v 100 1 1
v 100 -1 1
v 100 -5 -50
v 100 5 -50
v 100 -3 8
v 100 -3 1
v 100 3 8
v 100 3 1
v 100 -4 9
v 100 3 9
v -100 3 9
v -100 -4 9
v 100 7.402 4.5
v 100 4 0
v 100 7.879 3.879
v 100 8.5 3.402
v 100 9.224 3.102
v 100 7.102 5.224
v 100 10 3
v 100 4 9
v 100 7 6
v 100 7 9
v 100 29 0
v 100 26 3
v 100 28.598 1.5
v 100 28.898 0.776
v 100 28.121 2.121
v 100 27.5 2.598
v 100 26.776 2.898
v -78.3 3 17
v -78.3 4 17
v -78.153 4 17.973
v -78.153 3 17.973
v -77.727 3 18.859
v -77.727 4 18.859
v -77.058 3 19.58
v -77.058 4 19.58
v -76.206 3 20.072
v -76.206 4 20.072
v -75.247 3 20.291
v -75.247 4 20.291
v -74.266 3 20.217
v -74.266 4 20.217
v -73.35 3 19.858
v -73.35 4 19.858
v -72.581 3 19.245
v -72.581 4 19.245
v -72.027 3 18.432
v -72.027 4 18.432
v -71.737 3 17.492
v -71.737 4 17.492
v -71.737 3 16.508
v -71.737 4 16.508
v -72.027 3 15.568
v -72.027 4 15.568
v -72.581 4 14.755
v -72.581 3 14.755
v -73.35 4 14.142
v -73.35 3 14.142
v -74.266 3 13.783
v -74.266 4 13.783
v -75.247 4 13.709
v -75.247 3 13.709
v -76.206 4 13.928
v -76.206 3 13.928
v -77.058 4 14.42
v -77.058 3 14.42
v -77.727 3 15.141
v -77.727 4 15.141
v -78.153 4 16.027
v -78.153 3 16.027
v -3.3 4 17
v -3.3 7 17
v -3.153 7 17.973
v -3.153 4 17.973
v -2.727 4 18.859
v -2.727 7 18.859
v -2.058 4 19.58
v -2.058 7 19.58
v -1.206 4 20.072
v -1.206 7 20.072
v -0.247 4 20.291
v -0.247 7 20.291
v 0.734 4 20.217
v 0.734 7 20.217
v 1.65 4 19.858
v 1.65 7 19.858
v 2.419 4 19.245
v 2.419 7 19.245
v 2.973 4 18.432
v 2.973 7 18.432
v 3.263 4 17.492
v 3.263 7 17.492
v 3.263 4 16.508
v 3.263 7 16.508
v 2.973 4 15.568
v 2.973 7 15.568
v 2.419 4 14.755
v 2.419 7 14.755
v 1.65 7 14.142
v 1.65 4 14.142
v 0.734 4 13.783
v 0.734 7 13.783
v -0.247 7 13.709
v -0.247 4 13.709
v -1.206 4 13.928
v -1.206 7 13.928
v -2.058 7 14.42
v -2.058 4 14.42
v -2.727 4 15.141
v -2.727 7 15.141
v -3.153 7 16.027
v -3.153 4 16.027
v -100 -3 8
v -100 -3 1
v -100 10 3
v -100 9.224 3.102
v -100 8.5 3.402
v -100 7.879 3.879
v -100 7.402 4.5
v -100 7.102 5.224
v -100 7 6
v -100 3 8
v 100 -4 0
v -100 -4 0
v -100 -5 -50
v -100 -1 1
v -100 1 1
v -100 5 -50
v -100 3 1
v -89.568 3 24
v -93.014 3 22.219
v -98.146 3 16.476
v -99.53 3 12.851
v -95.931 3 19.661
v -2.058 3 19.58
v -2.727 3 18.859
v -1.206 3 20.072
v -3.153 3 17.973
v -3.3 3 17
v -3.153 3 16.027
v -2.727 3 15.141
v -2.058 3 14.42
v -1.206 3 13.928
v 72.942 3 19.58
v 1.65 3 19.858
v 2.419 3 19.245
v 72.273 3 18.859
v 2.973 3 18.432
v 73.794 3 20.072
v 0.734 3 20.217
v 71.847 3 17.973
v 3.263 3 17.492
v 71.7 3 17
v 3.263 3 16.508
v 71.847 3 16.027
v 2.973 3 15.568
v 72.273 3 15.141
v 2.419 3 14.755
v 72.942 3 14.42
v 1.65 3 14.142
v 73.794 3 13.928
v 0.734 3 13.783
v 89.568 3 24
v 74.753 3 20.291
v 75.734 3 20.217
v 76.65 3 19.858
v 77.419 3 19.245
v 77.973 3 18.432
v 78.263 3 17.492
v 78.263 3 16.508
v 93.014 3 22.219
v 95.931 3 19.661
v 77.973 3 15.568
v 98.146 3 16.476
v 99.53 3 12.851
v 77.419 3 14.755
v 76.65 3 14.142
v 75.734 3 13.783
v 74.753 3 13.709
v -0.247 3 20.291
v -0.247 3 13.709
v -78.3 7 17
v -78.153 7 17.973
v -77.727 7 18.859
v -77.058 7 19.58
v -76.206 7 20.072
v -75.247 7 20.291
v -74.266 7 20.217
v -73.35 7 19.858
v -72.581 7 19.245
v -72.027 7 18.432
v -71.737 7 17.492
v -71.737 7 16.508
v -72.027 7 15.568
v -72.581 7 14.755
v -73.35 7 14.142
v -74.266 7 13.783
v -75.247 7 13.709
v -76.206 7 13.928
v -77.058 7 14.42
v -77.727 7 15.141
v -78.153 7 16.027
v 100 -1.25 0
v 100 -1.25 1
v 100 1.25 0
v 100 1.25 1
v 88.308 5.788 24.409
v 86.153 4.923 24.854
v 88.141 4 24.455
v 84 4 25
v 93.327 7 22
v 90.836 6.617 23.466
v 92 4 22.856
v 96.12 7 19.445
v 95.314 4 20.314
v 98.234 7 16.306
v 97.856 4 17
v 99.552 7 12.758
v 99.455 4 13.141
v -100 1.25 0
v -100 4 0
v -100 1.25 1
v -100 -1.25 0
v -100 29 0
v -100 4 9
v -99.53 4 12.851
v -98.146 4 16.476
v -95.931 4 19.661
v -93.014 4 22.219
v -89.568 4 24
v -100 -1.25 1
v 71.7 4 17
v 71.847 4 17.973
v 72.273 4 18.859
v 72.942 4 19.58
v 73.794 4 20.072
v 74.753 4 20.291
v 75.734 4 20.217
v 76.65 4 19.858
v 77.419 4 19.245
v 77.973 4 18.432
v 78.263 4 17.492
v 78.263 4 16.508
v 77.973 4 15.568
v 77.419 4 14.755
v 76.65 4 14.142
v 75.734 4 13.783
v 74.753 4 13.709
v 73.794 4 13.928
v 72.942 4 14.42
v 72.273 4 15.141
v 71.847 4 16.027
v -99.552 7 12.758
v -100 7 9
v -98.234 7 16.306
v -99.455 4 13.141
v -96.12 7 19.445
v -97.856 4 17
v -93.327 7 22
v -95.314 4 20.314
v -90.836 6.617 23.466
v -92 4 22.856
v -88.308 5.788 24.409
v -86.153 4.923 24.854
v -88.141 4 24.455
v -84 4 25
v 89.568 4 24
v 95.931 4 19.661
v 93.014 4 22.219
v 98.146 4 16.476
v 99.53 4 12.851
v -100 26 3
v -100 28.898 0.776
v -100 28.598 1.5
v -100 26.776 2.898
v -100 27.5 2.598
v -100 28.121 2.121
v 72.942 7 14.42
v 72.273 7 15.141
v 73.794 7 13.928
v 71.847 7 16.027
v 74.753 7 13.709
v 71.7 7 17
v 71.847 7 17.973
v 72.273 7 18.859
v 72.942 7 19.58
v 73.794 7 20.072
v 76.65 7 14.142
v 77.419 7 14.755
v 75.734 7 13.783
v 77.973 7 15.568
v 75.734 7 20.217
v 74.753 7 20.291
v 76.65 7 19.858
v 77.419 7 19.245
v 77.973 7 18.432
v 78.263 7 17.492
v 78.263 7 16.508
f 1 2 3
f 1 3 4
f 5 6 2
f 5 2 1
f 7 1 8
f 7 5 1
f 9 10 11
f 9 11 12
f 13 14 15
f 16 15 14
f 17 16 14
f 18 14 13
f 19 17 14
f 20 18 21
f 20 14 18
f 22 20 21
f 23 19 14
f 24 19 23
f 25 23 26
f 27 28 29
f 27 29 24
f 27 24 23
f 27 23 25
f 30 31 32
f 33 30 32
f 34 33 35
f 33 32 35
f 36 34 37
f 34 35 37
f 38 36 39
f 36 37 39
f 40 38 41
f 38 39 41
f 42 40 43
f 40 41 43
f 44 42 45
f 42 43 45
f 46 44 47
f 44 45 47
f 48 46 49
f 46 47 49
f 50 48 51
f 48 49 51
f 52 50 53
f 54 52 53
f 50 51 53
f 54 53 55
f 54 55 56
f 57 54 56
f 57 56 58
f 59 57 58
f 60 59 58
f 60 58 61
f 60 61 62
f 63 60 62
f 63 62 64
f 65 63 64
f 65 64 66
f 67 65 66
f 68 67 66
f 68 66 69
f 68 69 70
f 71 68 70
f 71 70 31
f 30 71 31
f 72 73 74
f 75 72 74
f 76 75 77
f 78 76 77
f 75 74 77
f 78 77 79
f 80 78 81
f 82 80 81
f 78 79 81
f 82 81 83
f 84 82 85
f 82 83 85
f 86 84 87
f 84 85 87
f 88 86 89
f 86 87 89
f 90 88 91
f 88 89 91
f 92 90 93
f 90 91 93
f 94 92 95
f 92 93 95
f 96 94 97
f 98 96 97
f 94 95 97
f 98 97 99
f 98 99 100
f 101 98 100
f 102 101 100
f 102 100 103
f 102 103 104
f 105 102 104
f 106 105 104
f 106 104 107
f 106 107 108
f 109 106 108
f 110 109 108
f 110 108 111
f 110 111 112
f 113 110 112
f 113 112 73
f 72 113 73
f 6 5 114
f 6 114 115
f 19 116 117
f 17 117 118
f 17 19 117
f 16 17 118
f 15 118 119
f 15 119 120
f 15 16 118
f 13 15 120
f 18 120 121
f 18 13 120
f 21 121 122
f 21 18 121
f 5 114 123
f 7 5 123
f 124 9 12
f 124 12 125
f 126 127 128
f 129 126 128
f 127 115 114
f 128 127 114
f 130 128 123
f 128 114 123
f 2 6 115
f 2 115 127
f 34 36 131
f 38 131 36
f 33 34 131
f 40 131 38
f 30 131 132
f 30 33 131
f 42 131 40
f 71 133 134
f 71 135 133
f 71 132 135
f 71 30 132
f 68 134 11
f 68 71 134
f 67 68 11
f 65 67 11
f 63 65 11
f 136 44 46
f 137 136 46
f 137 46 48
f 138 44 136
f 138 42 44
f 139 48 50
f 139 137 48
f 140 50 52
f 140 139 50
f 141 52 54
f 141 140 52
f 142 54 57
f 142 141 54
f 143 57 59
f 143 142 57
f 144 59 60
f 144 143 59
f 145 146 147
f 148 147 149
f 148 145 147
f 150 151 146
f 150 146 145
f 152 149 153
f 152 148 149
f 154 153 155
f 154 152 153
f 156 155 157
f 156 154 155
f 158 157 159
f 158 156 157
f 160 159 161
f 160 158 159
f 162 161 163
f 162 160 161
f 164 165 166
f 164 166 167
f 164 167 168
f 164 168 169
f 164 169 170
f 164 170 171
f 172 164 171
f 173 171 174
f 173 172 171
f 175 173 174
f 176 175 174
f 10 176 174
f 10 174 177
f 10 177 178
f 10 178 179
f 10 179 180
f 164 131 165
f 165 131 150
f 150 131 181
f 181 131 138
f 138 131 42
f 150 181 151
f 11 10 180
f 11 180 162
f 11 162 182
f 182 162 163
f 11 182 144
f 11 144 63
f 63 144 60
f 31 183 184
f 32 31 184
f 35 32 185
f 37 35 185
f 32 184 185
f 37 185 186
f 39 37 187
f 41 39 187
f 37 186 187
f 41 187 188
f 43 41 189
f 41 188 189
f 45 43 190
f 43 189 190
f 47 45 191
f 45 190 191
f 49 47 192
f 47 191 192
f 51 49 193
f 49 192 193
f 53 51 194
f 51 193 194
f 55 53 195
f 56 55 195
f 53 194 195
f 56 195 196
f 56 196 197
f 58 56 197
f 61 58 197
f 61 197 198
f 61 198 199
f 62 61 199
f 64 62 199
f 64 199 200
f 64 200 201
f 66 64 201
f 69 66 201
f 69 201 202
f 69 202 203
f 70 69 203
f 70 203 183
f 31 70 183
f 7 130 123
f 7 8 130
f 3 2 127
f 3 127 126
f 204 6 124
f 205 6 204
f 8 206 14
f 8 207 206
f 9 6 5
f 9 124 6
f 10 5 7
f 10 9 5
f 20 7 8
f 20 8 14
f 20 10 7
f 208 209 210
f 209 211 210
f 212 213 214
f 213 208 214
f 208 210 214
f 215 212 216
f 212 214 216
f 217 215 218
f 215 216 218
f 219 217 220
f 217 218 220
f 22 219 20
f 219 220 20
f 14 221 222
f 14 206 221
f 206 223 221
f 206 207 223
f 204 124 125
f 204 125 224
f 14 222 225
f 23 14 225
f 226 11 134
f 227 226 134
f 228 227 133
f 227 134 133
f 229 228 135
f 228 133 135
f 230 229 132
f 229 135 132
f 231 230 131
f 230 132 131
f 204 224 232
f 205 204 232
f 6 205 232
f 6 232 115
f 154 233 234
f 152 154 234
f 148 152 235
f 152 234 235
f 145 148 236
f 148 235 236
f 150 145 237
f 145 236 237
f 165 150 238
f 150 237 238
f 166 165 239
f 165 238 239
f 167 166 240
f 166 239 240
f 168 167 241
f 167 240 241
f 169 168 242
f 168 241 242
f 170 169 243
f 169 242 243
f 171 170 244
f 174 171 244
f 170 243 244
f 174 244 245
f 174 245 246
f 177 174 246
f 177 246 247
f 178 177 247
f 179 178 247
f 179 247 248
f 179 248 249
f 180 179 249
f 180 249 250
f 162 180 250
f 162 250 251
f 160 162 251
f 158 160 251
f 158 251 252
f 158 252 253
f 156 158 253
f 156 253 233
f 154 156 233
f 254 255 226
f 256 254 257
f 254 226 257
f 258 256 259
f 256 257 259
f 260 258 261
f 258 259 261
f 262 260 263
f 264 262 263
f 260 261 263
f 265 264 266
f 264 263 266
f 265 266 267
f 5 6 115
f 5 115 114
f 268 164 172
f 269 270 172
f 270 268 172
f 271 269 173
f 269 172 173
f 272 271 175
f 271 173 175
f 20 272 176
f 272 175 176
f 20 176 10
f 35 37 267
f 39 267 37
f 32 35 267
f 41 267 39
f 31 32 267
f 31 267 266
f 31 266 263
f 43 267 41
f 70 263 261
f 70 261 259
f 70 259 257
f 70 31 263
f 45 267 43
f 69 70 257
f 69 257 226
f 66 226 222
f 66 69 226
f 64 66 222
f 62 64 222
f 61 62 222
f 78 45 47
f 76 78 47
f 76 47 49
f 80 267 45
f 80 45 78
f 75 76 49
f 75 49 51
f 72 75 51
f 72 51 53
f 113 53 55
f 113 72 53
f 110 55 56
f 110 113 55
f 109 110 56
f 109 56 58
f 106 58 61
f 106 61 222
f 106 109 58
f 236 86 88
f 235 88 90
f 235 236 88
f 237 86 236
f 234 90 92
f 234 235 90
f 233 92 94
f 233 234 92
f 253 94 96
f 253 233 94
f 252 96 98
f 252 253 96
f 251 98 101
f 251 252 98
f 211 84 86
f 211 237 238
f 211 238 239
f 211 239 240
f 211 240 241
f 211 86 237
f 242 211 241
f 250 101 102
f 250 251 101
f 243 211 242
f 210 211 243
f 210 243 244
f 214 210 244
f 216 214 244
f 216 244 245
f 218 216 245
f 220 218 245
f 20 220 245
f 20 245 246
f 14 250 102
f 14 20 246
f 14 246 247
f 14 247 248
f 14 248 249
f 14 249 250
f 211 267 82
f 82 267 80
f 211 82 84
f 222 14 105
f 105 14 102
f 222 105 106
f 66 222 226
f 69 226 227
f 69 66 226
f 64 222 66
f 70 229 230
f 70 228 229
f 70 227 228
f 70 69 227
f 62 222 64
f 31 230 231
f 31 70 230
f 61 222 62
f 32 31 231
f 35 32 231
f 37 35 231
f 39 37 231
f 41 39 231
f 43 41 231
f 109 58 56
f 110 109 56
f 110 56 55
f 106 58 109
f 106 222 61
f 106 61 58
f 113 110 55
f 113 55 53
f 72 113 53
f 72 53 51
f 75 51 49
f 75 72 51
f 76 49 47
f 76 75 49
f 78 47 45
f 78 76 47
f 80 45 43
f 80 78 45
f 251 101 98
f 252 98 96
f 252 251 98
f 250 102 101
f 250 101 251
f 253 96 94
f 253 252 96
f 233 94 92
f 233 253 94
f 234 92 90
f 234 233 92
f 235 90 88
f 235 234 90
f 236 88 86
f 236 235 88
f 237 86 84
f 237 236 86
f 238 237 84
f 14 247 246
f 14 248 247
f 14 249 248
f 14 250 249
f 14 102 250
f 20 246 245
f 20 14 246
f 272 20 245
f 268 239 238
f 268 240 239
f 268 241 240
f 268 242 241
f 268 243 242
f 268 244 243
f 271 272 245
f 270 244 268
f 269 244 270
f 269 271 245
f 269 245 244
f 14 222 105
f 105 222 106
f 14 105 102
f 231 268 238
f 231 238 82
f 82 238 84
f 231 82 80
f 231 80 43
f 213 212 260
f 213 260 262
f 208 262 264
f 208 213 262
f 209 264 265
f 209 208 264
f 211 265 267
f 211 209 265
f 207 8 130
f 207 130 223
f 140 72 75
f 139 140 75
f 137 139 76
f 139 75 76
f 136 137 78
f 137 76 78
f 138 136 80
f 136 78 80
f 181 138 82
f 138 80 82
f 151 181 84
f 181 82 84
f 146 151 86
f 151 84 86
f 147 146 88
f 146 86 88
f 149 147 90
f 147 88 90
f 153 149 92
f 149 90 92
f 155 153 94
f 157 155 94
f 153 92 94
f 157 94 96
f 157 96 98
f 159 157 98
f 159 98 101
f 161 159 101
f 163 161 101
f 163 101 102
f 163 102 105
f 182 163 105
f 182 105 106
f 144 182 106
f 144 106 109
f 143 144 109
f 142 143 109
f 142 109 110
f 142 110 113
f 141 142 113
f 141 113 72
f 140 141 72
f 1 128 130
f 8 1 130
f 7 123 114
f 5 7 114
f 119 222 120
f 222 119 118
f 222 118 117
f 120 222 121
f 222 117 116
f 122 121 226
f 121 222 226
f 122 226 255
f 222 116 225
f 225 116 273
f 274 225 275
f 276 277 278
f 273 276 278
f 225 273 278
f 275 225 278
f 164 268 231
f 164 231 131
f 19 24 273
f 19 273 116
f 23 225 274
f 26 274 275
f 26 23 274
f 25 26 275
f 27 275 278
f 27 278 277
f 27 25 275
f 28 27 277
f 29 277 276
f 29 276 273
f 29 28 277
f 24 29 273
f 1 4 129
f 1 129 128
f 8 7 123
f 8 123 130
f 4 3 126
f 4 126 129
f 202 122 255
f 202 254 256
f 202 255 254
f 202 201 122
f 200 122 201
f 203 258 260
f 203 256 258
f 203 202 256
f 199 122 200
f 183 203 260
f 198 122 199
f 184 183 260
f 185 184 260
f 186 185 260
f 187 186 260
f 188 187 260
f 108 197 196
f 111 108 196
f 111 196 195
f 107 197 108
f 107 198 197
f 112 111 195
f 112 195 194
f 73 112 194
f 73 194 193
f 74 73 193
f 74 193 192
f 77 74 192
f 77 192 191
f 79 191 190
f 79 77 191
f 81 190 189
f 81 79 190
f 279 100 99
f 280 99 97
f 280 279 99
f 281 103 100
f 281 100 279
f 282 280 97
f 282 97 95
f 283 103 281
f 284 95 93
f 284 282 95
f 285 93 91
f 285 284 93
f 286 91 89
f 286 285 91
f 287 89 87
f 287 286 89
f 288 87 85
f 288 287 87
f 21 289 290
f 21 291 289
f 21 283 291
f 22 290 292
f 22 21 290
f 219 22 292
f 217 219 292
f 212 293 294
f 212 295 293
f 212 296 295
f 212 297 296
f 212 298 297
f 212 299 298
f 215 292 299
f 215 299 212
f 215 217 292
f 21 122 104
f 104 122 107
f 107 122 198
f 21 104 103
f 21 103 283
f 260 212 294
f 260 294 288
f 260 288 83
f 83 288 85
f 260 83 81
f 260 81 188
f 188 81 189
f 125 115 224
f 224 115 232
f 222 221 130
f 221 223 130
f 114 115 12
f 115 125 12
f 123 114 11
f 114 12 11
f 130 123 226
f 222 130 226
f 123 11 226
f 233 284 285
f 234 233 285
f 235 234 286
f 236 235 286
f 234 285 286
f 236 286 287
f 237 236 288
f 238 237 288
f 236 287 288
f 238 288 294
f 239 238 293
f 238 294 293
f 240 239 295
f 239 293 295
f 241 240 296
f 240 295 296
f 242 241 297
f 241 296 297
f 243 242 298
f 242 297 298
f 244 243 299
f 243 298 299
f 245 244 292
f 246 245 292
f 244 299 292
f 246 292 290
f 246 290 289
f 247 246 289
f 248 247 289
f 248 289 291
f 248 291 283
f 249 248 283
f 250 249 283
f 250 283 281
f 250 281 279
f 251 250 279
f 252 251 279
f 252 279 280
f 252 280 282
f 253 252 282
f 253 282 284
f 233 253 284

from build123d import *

# Parameters (mm, degrees)
F1_DEPTH = 100
F3_DEPTH = 100
F5_DEPTH = 200
F7_D     = 6.6
F7_2_D   = 6.6
F9_DEPTH = 26.001


with BuildPart() as f1:
    # F0 (on Right) → F1 (new body, symmetric)
    with BuildSketch(Plane.YZ):
        Polygon((4, 0), (4, 24), (3, 24), (3, 9), (-4, 9), (-4, 0), (-1.25, 0), (-1.25, 1), (-3, 1), (-3, 8), (3, 8), (3, 1), (1.25, 1), (1.25, 0), align=None)
    extrude(amount=F1_DEPTH, both=True)

    # F7 (through all)
    with Locations(Plane.XZ.offset(-3)):
        with Locations((-75, 17), (0, 17), (75, 17)):
            Hole(F7_D / 2)


with BuildPart() as f3:
    # F2 (on Right) → F3 (new body, symmetric)
    with BuildSketch(Plane.YZ):
        Polygon((3, 8), (-3, 8), (-3, 1), (-1, 1), (-5, -50), (5, -50), (1, 1), (3, 1), align=None)
    extrude(amount=F3_DEPTH, both=True)


with BuildPart() as f5:
    # F4 (on face) → F5 (new body, through all)
    with BuildSketch(Plane.YZ.offset(100)):
        with BuildLine():
            ThreePointArc((7, 22), (6.1213203436, 24.1213203436), (4, 25))
            Line((4, 25), (4, 0))
            Line((4, 0), (29, 0))
            ThreePointArc((29, 0), (28.1213203436, 2.1213203436), (26, 3))
            Line((26, 3), (10, 3))
            ThreePointArc((10, 3), (7.8786796564, 3.8786796564), (7, 6))
            Line((7, 6), (7, 22))
        make_face()
    extrude(amount=-F5_DEPTH)

    # F7#2 (through all)
    with Locations(Plane.XZ.offset(-3)):
        with Locations((-75, 17), (0, 17), (75, 17)):
            Hole(F7_2_D / 2)


with BuildPart() as f9_tool:
    # F8 (on face) → F9 (new body, through all)
    with BuildSketch(Plane.XZ.offset(-3)):
        with BuildLine():
            ThreePointArc((-100, 9), (-95.313708499, 20.313708499), (-84, 25))
            Line((-84, 25), (-100, 25))
            Line((-100, 25), (-100, 9))
        make_face()
        with BuildLine():
            Line((100, 25), (84, 25))
            ThreePointArc((84, 25), (95.313708499, 20.313708499), (100, 9))
            Line((100, 9), (100, 25))
        make_face()
    extrude(amount=-F9_DEPTH)


with BuildPart() as f1_1:
    add(f1.part)

    # F9: cut by f9_tool
    add(f9_tool.part, mode=Mode.SUBTRACT)


with BuildPart() as f5_1:
    add(f5.part)

    # F9: cut by f9_tool
    add(f9_tool.part, mode=Mode.SUBTRACT)


solid = Compound([f3.part, f1_1.part, f5_1.part])
